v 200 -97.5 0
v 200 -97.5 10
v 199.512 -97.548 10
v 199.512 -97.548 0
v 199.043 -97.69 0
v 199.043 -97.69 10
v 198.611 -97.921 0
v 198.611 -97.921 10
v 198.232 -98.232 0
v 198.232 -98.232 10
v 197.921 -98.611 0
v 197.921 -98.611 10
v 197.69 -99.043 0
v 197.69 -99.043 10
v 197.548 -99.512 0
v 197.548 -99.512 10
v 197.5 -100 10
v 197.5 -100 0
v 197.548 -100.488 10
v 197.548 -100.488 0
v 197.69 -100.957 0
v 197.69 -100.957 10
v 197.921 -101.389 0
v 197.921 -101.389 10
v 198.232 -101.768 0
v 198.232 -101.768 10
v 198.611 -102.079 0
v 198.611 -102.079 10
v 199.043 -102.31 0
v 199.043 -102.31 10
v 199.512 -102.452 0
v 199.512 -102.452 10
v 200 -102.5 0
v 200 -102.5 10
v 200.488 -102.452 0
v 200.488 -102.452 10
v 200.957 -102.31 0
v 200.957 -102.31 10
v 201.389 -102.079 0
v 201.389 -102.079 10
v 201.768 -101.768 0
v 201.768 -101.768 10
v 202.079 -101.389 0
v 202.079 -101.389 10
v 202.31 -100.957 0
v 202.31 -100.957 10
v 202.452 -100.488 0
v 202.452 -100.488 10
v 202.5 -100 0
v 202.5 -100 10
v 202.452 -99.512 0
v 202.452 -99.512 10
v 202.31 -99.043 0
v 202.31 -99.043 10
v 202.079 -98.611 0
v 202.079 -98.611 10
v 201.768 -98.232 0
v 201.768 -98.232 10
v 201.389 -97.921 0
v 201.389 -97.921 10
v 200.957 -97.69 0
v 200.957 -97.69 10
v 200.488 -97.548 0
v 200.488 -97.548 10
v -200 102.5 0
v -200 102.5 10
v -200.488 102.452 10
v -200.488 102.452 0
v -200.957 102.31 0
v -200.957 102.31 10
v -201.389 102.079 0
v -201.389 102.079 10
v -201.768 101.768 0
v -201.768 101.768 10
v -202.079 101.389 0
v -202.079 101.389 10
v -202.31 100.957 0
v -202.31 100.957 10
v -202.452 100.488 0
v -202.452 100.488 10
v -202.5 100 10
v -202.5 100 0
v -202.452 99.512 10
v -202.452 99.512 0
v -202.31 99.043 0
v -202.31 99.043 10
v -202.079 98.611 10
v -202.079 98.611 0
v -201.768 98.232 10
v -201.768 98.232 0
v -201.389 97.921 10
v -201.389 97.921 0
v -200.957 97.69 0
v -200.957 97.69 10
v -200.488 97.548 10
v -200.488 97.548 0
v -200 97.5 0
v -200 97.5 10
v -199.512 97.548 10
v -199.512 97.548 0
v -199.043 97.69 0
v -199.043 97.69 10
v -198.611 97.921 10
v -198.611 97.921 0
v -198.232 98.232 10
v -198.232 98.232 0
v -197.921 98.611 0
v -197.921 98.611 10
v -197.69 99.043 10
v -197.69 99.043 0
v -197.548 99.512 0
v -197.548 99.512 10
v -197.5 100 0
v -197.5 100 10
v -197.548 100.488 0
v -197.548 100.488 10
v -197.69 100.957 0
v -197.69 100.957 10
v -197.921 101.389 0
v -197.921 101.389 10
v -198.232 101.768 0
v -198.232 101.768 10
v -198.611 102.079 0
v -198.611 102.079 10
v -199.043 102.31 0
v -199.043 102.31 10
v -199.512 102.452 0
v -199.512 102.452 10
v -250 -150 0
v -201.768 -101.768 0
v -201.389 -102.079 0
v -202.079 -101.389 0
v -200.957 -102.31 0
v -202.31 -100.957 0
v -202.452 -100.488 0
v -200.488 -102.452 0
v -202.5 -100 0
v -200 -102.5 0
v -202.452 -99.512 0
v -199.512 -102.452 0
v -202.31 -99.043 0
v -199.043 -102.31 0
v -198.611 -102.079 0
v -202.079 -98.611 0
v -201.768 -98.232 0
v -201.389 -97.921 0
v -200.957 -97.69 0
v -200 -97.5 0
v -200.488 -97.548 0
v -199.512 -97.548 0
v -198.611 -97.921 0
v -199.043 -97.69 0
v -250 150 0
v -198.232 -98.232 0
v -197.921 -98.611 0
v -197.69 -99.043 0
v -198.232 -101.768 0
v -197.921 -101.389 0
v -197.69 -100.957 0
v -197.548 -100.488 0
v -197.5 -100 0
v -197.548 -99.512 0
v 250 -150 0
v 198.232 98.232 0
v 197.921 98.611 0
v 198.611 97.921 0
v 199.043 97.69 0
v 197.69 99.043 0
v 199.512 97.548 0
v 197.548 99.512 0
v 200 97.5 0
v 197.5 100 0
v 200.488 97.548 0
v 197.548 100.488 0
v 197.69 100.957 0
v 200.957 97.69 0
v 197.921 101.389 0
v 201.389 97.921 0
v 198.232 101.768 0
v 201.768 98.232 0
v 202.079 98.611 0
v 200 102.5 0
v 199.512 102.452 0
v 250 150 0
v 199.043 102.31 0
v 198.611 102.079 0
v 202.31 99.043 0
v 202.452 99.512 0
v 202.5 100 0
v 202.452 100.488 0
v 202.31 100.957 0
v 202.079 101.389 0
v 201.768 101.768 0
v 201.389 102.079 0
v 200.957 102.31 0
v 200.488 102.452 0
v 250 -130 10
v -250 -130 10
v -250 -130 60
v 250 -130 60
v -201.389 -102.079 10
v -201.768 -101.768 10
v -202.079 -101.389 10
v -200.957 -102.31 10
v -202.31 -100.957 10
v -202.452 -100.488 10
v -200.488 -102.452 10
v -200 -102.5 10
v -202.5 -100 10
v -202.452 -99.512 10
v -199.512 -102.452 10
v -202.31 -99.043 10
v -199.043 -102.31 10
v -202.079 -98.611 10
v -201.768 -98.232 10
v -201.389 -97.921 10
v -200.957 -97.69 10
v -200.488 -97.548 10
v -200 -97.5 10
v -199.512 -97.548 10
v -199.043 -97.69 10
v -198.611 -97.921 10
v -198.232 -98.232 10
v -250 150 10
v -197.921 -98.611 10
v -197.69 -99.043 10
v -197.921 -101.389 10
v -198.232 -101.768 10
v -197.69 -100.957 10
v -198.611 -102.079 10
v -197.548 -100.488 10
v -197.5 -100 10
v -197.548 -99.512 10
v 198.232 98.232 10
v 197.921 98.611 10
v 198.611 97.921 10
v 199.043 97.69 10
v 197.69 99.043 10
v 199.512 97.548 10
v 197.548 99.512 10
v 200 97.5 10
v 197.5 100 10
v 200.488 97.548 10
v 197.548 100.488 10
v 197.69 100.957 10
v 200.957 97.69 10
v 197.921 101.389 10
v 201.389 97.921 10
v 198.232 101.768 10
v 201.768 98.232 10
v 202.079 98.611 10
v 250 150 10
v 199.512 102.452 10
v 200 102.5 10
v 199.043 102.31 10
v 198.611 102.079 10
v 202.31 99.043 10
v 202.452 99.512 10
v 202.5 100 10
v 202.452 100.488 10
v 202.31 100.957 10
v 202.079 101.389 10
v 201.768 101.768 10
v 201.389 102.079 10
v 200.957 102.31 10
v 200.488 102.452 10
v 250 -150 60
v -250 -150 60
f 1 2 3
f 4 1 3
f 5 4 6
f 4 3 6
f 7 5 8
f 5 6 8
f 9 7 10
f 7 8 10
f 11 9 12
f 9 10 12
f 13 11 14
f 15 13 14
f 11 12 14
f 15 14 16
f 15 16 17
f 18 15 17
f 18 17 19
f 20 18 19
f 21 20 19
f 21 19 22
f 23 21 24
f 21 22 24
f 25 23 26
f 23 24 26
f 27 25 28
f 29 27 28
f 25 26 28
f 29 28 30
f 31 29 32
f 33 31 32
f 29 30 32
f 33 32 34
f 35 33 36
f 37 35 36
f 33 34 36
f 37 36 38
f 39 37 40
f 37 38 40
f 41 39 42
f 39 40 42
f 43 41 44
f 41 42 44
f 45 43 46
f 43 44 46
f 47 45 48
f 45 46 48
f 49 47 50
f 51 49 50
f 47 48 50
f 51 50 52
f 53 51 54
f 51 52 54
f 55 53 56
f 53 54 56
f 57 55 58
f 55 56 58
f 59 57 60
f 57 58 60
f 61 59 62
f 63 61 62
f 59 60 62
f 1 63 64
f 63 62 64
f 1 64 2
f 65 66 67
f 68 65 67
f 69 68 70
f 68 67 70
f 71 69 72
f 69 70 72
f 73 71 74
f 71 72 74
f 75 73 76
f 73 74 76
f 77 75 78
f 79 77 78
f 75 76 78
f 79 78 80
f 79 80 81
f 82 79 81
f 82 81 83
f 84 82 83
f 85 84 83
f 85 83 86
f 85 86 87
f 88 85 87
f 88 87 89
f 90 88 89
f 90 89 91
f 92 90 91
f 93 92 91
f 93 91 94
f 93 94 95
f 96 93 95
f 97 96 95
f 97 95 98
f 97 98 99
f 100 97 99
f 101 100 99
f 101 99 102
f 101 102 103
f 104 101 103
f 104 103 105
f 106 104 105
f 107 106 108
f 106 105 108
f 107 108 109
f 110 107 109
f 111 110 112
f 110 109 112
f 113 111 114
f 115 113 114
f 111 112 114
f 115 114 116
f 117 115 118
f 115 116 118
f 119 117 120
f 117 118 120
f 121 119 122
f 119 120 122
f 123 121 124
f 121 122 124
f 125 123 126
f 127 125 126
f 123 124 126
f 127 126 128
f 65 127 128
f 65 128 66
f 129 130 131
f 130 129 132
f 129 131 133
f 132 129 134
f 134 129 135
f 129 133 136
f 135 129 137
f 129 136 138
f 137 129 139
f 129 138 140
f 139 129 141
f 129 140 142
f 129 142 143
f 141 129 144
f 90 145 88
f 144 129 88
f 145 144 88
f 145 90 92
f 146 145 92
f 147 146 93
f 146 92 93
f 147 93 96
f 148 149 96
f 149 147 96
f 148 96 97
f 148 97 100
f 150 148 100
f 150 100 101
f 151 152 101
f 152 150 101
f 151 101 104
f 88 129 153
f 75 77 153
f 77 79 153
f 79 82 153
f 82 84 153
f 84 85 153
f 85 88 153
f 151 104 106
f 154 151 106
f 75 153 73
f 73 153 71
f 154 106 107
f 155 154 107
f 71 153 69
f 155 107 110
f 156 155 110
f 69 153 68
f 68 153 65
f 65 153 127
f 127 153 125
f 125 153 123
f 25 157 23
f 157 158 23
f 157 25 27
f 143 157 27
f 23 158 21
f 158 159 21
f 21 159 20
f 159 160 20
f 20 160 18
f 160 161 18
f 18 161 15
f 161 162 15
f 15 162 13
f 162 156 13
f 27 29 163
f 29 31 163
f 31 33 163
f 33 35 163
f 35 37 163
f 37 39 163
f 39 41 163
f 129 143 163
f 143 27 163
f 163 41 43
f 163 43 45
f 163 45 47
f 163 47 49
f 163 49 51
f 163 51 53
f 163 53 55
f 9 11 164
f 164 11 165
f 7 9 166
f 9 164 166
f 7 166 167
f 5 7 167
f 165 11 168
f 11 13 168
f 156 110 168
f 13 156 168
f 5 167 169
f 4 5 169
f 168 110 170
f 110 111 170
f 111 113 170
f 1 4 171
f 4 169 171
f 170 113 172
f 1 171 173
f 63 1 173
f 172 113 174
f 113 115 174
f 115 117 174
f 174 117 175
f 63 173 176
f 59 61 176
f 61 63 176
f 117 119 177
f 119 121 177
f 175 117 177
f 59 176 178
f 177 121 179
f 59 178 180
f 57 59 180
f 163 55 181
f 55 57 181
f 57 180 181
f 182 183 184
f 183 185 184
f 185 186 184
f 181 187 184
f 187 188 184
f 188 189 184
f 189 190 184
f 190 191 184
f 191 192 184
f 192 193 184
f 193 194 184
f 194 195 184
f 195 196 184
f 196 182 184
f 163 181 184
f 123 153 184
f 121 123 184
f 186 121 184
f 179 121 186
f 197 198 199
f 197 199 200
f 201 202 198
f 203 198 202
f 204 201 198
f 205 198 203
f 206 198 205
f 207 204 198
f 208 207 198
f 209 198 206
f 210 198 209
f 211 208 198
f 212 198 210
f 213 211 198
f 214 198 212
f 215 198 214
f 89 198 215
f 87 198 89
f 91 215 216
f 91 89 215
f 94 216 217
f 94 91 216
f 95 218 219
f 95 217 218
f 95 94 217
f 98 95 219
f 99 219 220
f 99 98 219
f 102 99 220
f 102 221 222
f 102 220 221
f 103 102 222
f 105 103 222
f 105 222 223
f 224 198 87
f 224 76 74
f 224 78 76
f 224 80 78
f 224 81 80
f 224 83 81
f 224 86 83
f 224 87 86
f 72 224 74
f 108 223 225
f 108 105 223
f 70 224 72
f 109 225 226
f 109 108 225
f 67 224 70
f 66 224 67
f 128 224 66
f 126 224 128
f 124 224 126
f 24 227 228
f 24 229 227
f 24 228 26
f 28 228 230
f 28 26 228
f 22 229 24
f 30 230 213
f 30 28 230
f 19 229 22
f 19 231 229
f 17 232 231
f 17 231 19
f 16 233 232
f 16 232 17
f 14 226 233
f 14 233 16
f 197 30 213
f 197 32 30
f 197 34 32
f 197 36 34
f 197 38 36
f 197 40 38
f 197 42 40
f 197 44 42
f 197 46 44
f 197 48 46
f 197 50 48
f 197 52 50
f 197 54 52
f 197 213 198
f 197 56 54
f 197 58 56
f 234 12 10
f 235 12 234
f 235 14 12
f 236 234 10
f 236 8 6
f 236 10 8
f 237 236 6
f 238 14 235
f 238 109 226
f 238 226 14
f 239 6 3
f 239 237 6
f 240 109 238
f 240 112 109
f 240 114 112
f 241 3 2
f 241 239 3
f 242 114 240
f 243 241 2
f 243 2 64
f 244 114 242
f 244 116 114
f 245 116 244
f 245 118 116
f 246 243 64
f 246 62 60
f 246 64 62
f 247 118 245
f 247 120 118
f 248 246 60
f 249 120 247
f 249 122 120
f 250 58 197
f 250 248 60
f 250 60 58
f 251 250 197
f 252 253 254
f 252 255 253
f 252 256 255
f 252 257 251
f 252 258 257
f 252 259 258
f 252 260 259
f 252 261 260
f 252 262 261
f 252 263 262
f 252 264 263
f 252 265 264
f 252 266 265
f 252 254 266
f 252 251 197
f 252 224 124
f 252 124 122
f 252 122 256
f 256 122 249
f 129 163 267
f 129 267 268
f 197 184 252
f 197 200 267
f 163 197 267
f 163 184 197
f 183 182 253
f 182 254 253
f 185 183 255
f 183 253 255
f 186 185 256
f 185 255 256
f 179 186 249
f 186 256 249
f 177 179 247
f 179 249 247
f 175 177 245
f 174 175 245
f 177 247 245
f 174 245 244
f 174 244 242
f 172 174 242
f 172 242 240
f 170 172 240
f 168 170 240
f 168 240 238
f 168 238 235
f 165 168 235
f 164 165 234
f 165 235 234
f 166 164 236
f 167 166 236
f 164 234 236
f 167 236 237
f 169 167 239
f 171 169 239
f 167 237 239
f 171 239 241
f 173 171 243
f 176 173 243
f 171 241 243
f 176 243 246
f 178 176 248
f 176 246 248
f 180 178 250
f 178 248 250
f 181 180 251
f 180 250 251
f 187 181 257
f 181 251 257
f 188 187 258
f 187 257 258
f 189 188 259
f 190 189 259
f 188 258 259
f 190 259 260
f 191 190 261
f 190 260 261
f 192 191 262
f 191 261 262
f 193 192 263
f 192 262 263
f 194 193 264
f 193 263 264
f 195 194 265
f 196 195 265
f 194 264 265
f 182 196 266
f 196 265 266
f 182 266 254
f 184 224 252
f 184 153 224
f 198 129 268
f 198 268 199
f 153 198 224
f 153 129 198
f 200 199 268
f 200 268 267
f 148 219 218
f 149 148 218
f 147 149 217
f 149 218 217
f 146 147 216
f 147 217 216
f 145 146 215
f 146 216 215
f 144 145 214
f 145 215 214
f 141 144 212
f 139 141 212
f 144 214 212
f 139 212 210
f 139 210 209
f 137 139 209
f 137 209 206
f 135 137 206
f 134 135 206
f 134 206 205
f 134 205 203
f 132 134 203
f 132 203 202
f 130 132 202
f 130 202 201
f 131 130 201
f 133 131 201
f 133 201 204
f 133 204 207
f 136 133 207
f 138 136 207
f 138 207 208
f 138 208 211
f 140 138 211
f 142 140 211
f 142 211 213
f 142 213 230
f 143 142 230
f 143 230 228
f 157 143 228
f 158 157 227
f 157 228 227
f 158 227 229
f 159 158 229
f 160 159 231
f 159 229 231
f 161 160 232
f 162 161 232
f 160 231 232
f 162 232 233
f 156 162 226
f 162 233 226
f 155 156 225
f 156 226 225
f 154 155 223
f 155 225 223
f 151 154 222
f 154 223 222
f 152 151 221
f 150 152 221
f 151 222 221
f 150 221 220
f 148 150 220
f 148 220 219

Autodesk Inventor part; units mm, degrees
ref_plane "YZ Plane" through (0, 0, 0) normal (1, 0, 0) x (0, 1, 0)
ref_plane "XZ Plane" through (0, 0, 0) normal (0, 1, 0) x (-1, 0, 0)
ref_plane "XY Plane" through (0, 0, 0) normal (0, 0, 1) x (1, 0, 0)
sketch "Sketch1" plane through (0, 0, 0) normal (0, 0, 1) x (1, 0, 0)
  line L0 (250, -150) -> (-250, -150)
  line L1 (-250, -150) -> (-250, 150)
  line L2 (-250, 150) -> (250, 150)
  line L3 (250, 150) -> (250, -150)
  line L4 (250, -150) -> (-250, 150) construction
  line L5 (-250, -150) -> (250, 150) construction
  point P0 (0, 0)
  dimension "d0" = 500
  dimension "d1" = 300
extrude "Extrusion1" add sketch "Sketch1" along normal blind 10
sketch "Sketch2" plane through (0, 0, 10) normal (0, 0, 1) x (1, 0, 0)
  line L0 (-250, 150) -> (-250, -150) projected
  line L1 (-250, -150) -> (250, -150) projected
  line L2 (-250, -130) -> (250, -130)
  line L3 (250, -130) -> (250, -150)
  line L4 (250, -150) -> (-250, -150)
  line L5 (-250, -150) -> (-250, -130)
  point P0 (0, 0)
  dimension "d6" = 20
extrude "Extrusion2" add sketch "Sketch2" along normal blind 50
sketch "Sketch3" plane through (0, 0, 0) normal (0, 0, -1) x (-1, 0, 0)
  line L0 (-250, -150) -> (-250, 150) projected
  line L1 (-250, 150) -> (250, 150) projected
  line L2 (250, 150) -> (250, -150) projected
  line L3 (250, -150) -> (-250, -150) projected
  point P0 (0, 0)
  point P1 (-200, 100)
  point P2 (200, 100)
  point P3 (-200, -100)
  point P4 (200, -100)
  dimension "d7" = 50
  dimension "d8" = 50
  dimension "d9" = 50
  dimension "d10" = 50
  dimension "d11" = 50
  dimension "d12" = 50
  dimension "d13" = 50
  dimension "d14" = 50
hole "Hole1" at (200, 100, 0) at (-200, 100, 0) at (200, -100, 0) at (-200, -100, 0) direction (0, 0, 1) diameter 5 end through all
